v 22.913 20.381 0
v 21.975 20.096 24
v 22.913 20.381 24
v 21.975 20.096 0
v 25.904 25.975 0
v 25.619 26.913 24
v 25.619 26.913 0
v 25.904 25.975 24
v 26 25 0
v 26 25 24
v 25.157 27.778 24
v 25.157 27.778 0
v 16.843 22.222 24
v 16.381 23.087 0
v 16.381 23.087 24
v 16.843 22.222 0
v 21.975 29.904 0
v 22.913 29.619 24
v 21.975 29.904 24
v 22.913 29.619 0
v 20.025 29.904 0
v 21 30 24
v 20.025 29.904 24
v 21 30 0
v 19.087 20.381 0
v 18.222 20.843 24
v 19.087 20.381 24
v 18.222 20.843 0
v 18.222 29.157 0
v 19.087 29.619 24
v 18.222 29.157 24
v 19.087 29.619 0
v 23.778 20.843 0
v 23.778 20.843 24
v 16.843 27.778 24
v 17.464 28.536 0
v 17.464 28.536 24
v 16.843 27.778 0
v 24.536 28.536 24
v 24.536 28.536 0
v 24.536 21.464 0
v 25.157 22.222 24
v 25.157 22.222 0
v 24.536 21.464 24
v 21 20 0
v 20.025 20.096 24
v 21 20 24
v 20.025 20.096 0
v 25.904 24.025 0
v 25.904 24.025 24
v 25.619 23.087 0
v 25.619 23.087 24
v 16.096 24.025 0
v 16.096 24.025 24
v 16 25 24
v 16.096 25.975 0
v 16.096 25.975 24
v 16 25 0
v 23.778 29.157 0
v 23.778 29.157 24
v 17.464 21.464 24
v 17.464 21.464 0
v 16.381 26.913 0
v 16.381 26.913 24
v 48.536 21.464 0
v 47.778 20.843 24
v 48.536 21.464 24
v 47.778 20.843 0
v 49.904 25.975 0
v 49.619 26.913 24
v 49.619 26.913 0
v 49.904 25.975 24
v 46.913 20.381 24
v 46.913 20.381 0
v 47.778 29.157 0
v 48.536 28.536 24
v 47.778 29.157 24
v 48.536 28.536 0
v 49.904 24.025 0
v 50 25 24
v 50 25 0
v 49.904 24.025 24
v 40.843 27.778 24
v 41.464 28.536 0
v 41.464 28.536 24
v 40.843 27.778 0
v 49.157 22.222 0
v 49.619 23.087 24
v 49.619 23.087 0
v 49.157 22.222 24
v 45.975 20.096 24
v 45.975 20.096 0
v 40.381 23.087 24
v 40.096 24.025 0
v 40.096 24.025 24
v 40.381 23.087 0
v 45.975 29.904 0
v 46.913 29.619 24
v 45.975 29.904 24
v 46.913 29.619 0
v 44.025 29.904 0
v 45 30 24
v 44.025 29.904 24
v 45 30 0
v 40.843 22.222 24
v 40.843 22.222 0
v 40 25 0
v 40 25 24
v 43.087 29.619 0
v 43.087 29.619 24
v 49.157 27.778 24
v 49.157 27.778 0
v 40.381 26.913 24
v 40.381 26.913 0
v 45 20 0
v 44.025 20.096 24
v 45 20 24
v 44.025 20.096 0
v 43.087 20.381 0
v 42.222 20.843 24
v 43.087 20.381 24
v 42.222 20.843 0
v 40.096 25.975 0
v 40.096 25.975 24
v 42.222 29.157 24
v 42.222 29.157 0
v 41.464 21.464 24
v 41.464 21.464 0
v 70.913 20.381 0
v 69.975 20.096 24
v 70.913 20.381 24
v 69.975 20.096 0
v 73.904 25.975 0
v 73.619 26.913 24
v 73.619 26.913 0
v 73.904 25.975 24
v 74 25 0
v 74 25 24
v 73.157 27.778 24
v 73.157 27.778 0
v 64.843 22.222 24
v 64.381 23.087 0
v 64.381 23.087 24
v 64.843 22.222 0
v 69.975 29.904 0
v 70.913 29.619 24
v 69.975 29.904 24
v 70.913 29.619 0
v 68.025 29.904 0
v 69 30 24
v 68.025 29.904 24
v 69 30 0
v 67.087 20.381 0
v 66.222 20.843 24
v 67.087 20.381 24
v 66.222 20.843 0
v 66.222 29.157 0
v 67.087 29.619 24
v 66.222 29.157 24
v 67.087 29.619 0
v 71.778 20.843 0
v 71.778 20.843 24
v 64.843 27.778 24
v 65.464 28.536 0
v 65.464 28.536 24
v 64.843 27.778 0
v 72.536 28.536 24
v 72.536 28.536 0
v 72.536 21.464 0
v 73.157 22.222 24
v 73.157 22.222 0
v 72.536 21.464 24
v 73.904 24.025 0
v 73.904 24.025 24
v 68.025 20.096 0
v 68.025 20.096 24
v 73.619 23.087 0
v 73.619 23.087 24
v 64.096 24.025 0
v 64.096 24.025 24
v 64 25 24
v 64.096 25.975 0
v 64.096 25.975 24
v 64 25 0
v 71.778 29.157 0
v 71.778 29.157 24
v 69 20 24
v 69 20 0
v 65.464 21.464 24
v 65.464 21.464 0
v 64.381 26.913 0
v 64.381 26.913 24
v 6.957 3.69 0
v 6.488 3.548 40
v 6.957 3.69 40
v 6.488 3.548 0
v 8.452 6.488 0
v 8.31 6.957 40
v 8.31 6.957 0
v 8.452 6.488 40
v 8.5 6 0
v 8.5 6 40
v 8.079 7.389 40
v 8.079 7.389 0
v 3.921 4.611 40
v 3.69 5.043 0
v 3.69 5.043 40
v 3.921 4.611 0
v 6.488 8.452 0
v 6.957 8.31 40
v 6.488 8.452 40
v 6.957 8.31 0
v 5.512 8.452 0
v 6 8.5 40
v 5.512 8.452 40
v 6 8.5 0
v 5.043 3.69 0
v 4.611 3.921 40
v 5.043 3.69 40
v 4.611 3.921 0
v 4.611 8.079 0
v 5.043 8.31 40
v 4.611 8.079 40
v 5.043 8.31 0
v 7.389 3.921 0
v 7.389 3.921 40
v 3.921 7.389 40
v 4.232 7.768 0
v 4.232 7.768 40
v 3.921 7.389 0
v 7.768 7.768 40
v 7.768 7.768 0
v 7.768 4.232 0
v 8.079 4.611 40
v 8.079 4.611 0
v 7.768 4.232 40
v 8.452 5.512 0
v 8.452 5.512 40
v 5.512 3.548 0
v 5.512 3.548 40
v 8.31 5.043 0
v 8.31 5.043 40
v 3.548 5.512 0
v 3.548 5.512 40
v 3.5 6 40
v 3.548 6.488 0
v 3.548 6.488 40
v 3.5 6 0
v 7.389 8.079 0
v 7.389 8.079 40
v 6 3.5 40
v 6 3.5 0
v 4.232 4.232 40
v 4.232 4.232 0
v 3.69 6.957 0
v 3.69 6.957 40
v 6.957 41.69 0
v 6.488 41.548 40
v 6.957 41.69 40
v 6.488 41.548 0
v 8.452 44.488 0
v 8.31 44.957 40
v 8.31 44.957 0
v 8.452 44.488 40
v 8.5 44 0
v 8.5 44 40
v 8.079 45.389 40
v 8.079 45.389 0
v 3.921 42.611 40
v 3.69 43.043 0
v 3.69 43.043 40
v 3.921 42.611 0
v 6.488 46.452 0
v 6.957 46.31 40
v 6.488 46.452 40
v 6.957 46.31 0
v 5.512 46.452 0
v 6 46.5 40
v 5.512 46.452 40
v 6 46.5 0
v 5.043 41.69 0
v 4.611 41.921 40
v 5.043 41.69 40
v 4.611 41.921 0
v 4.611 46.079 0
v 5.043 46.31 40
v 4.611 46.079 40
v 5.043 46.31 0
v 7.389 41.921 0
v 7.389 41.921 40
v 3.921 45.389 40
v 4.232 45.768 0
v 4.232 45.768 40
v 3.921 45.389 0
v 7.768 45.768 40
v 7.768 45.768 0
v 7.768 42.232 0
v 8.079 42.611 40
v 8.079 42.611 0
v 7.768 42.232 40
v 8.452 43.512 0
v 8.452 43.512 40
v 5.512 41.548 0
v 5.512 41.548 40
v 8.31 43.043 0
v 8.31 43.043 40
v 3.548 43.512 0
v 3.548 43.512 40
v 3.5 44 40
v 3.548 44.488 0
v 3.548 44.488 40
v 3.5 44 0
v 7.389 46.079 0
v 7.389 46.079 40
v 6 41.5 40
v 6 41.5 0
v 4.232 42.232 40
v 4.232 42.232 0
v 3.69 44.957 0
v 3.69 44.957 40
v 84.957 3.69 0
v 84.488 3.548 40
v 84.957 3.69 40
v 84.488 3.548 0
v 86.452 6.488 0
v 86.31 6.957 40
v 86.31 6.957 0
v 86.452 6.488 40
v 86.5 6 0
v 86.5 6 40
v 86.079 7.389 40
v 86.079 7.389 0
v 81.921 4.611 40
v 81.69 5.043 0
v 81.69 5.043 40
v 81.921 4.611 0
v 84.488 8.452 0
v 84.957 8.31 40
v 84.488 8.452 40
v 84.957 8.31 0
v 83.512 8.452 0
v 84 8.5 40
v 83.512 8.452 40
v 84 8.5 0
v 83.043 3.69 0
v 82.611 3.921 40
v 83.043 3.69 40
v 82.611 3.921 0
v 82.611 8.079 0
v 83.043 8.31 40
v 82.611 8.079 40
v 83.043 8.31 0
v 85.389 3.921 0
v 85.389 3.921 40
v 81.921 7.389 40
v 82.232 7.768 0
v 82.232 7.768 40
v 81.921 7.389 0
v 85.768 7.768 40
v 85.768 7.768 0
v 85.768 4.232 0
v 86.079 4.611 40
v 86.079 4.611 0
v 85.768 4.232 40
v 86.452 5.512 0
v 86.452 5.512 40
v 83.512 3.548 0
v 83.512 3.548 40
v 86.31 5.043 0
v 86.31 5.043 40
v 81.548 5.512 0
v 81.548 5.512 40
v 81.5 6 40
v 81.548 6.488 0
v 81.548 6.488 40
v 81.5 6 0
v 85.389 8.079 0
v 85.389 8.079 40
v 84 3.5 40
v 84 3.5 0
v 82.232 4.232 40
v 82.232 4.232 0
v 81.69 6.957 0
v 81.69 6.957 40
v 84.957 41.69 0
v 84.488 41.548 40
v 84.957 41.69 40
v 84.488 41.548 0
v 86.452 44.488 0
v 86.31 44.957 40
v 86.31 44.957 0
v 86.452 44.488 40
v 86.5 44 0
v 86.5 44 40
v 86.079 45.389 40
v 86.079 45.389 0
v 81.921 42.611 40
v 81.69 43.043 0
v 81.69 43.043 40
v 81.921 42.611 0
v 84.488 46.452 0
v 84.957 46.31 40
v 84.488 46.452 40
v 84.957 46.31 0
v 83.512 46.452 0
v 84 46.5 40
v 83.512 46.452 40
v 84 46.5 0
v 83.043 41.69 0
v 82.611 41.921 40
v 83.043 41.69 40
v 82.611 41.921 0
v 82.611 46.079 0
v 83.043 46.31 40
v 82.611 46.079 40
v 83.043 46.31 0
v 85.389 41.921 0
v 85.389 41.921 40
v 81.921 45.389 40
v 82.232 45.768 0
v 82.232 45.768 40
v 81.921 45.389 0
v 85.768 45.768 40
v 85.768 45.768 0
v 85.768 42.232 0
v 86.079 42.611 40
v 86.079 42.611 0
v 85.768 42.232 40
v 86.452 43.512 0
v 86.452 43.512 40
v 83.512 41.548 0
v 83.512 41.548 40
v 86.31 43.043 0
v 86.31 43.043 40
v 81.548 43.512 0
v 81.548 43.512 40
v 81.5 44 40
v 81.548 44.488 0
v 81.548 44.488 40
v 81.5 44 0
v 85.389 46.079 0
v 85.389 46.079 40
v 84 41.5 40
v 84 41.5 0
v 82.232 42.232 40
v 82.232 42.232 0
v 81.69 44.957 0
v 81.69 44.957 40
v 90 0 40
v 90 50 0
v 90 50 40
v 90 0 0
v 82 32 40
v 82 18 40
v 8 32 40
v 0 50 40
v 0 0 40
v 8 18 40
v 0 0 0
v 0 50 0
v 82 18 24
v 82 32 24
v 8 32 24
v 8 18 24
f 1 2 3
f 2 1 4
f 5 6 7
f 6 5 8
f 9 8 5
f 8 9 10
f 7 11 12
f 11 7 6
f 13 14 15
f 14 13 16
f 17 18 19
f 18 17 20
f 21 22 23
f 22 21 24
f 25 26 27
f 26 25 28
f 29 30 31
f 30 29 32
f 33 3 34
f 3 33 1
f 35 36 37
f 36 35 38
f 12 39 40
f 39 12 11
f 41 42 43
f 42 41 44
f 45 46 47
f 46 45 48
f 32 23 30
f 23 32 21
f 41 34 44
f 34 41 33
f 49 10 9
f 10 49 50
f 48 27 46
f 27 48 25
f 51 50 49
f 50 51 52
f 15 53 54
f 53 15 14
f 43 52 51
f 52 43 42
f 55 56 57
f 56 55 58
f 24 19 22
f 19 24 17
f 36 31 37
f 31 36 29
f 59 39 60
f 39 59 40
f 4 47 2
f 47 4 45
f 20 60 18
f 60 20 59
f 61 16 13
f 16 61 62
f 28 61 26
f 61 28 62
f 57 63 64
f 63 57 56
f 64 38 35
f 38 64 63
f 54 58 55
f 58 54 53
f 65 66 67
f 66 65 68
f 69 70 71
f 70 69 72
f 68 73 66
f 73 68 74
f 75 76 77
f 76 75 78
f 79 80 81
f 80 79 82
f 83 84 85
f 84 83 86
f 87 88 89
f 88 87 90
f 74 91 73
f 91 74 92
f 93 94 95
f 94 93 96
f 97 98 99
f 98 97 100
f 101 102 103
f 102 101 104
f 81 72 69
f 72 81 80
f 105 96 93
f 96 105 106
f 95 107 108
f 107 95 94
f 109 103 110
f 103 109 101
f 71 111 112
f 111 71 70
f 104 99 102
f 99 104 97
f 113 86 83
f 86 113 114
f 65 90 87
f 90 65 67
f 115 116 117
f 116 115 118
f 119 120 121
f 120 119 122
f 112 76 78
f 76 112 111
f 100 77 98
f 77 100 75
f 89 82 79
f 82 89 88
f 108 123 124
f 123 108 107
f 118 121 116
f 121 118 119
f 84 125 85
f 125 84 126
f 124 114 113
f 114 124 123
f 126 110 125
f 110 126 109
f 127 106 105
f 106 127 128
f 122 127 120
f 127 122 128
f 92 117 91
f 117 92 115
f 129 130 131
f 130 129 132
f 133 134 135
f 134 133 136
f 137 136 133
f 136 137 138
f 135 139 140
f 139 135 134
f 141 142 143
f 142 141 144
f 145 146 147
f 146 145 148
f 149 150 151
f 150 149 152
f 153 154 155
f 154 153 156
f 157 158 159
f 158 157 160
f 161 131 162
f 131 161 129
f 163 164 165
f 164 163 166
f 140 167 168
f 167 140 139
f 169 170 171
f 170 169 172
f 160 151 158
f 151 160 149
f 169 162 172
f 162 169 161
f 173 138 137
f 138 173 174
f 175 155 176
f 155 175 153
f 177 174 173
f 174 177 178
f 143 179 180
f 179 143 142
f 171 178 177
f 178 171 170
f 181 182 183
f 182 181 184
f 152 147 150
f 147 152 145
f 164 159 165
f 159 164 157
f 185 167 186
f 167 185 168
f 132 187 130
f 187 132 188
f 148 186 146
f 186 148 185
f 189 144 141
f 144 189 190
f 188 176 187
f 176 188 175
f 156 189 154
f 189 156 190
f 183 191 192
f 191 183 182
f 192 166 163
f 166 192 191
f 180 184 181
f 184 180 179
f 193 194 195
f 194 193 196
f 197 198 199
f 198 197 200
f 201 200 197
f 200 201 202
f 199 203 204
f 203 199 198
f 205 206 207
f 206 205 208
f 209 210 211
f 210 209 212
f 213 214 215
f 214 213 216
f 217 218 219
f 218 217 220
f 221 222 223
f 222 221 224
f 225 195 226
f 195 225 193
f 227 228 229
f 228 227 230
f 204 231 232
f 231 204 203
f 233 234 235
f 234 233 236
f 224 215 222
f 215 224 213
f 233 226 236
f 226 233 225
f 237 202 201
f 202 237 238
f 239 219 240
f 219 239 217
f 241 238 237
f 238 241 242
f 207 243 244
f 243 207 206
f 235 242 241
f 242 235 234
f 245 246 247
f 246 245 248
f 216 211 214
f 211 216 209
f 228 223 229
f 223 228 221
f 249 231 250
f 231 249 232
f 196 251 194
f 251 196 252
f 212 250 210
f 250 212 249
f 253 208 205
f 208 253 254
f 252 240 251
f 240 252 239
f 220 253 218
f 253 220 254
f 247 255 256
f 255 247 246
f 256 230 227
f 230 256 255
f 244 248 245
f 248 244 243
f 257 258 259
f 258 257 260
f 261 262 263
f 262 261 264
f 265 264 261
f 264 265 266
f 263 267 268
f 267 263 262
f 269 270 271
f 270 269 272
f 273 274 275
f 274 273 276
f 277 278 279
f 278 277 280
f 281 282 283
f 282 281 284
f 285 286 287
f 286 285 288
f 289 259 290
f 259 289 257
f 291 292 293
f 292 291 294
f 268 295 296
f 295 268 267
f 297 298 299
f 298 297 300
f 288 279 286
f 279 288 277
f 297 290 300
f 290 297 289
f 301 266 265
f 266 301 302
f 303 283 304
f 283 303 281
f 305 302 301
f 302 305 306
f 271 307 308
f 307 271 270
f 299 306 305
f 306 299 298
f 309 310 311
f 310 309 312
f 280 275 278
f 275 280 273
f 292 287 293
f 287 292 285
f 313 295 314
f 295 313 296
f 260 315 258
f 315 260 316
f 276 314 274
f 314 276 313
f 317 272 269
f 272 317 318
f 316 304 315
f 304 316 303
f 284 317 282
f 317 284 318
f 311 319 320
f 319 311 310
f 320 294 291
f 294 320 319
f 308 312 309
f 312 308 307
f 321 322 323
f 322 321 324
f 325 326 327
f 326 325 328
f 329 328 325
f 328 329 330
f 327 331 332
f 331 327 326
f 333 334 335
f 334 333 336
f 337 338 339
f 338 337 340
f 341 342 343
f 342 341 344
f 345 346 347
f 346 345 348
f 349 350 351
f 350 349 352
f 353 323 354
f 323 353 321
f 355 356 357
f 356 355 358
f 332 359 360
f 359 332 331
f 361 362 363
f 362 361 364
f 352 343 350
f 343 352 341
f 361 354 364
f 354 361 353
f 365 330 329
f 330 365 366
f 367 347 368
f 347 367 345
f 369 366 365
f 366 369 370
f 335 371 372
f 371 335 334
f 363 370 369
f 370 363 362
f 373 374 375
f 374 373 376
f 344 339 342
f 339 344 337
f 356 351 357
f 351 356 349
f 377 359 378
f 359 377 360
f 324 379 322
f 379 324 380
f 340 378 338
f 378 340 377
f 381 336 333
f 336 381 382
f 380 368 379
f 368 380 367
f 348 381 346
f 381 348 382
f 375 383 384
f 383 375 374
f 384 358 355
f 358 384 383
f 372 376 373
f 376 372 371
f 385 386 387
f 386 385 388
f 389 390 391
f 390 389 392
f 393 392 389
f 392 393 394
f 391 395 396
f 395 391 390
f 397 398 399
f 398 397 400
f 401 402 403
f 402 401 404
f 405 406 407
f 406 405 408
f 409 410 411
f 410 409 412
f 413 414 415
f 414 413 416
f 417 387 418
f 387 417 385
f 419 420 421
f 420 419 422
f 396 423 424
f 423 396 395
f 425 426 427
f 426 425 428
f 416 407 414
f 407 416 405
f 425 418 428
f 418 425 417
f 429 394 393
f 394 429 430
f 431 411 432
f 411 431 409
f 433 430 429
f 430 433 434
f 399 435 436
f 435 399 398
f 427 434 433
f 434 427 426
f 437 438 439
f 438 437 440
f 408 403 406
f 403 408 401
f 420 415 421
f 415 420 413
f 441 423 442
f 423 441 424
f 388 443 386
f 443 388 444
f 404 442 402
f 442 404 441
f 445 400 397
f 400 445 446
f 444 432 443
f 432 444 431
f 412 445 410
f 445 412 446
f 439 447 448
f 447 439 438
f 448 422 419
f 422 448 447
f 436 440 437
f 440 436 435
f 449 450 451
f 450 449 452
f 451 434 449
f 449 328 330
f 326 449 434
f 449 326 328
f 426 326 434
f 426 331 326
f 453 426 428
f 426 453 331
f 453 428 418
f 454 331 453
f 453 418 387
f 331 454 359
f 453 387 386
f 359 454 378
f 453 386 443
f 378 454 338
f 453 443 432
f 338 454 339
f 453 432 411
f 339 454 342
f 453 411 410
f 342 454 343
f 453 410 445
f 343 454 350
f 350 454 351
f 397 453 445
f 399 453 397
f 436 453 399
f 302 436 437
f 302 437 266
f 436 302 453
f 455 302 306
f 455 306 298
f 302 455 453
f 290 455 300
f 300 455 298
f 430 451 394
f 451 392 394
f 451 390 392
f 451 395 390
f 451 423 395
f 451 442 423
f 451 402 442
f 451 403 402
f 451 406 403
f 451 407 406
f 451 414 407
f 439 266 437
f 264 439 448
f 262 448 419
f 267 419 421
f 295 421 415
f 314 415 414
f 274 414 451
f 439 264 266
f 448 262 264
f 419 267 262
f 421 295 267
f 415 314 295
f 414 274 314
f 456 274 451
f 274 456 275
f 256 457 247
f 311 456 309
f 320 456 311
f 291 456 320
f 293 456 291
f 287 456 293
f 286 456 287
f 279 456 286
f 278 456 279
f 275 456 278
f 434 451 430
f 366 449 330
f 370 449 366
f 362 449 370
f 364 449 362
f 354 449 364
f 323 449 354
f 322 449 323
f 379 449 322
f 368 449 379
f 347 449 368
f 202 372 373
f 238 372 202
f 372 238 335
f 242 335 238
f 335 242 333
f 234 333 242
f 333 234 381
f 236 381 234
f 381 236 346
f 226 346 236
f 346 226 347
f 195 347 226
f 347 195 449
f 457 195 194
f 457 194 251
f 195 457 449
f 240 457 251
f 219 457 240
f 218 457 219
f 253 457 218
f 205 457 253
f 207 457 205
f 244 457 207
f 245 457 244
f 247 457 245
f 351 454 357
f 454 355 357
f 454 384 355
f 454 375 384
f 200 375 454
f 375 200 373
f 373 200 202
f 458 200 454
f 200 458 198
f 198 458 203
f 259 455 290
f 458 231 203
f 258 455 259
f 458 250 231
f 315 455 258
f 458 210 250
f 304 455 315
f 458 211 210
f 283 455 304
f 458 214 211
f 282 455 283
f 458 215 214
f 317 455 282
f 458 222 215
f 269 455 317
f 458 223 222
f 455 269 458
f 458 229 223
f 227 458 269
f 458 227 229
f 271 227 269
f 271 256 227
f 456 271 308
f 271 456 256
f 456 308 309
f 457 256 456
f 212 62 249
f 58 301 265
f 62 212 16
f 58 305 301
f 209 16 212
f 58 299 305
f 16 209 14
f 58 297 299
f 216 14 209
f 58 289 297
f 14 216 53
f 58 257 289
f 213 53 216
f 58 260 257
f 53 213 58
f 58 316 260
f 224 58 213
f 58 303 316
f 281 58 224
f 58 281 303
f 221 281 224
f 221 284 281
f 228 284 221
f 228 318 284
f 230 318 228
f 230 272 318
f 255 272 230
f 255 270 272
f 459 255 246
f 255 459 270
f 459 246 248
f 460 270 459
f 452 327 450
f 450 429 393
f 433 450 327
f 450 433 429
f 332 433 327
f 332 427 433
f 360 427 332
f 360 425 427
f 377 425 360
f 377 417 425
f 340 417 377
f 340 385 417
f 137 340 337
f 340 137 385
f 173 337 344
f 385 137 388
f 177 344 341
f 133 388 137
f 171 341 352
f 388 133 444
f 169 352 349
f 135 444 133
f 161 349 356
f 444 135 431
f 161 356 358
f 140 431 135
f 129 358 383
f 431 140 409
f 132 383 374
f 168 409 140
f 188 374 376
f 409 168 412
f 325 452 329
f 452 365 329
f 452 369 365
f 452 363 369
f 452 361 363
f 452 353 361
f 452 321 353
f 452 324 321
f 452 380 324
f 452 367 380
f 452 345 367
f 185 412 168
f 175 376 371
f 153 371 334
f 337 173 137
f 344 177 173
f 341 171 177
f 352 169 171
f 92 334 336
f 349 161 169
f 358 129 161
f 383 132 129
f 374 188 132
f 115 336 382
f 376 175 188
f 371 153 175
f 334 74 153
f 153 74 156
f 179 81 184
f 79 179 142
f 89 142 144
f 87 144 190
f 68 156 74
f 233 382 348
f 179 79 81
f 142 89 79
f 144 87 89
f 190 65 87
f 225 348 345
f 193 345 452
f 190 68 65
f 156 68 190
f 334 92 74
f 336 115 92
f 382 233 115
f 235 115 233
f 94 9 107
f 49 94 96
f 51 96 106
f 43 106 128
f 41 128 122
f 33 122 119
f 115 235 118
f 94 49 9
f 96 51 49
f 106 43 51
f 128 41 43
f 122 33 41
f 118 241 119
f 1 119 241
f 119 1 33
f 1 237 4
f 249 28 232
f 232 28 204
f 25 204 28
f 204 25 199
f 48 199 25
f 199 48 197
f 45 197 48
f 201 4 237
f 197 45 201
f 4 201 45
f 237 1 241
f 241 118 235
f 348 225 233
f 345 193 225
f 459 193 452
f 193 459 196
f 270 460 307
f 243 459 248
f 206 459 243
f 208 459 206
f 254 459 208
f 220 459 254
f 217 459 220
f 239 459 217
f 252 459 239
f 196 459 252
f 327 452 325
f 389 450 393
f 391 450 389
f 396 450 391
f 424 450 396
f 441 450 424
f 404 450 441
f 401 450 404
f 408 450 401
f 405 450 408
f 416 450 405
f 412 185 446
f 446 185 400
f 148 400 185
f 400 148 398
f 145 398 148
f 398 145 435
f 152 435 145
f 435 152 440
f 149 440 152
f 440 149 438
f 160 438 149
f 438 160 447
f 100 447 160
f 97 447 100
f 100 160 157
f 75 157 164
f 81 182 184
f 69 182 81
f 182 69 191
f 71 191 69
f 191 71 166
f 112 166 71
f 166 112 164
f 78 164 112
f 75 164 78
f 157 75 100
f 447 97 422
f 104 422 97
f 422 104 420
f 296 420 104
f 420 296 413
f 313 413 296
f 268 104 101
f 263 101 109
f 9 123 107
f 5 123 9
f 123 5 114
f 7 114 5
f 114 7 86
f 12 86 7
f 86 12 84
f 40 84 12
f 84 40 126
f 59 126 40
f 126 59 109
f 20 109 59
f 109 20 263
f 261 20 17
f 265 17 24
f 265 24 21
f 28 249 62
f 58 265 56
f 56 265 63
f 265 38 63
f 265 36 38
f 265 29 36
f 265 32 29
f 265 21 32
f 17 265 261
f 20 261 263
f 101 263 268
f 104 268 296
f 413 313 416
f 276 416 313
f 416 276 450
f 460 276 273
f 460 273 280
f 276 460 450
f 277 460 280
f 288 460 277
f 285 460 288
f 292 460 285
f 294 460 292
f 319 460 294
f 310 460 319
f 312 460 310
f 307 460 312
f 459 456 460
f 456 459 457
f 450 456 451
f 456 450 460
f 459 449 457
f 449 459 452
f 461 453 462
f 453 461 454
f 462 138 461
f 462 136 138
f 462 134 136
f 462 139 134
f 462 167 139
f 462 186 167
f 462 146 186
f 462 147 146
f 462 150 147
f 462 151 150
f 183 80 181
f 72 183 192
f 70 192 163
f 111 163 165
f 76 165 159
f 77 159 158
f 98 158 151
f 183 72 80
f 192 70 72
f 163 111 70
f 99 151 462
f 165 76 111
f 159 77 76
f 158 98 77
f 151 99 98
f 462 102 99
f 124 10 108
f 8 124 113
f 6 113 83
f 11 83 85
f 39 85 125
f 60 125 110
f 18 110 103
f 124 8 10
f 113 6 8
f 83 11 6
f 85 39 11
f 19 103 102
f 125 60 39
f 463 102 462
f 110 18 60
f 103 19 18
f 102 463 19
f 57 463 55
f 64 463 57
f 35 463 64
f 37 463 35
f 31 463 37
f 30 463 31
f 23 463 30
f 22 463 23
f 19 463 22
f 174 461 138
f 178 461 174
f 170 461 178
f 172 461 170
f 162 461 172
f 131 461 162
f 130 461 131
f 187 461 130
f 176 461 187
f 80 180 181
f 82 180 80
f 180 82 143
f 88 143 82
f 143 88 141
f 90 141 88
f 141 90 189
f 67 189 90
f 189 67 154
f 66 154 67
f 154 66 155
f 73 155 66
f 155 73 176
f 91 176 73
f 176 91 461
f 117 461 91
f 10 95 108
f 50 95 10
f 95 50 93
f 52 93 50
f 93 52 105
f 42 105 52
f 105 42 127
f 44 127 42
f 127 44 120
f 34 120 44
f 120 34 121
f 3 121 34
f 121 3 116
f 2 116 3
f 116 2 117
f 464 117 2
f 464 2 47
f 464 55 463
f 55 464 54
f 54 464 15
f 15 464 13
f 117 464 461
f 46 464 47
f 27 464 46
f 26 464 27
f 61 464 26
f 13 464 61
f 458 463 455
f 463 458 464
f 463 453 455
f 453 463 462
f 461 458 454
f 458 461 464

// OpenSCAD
$fn = 32;

// ----------------------------------------------------------------------
// Manifold block: gallery_top manifold
// ----------------------------------------------------------------------

// --- parameters (mm) ---
block_l = 90;             // block length, X
block_w = 50;             // block width, Y
block_h = 40;             // block height, Z
port_d = 10;              // port bore diameter
port_pitch = 24;          // port pitch along X
gallery_d = 14;           // top gallery width, Y
gallery_depth = 16;       // gallery pocket depth
wall_p = 8;               // gallery end wall thickness, X
mnt_d = 5;                // mounting hole diameter
mnt_in = 6;               // mounting hole inset from the edges

n_ports = 3;  // ports in the row
port_x0 = (block_l - (n_ports - 1) * port_pitch) / 2;  // first port X

difference() {
  cube([block_l, block_w, block_h]);
  for (i = [0 : n_ports - 1])
    translate([port_x0 + i * port_pitch, block_w / 2, -1])
      cylinder(h = block_h + 2, d = port_d);
  translate([wall_p, block_w / 2 - gallery_d / 2, block_h - gallery_depth])
    cube([block_l - 2 * wall_p, gallery_d, gallery_depth + 1]);
  for (cx = [mnt_in, block_l - mnt_in])
    for (cy = [mnt_in, block_w - mnt_in])
      translate([cx, cy, -1]) cylinder(h = block_h + 2, d = mnt_d);
}
